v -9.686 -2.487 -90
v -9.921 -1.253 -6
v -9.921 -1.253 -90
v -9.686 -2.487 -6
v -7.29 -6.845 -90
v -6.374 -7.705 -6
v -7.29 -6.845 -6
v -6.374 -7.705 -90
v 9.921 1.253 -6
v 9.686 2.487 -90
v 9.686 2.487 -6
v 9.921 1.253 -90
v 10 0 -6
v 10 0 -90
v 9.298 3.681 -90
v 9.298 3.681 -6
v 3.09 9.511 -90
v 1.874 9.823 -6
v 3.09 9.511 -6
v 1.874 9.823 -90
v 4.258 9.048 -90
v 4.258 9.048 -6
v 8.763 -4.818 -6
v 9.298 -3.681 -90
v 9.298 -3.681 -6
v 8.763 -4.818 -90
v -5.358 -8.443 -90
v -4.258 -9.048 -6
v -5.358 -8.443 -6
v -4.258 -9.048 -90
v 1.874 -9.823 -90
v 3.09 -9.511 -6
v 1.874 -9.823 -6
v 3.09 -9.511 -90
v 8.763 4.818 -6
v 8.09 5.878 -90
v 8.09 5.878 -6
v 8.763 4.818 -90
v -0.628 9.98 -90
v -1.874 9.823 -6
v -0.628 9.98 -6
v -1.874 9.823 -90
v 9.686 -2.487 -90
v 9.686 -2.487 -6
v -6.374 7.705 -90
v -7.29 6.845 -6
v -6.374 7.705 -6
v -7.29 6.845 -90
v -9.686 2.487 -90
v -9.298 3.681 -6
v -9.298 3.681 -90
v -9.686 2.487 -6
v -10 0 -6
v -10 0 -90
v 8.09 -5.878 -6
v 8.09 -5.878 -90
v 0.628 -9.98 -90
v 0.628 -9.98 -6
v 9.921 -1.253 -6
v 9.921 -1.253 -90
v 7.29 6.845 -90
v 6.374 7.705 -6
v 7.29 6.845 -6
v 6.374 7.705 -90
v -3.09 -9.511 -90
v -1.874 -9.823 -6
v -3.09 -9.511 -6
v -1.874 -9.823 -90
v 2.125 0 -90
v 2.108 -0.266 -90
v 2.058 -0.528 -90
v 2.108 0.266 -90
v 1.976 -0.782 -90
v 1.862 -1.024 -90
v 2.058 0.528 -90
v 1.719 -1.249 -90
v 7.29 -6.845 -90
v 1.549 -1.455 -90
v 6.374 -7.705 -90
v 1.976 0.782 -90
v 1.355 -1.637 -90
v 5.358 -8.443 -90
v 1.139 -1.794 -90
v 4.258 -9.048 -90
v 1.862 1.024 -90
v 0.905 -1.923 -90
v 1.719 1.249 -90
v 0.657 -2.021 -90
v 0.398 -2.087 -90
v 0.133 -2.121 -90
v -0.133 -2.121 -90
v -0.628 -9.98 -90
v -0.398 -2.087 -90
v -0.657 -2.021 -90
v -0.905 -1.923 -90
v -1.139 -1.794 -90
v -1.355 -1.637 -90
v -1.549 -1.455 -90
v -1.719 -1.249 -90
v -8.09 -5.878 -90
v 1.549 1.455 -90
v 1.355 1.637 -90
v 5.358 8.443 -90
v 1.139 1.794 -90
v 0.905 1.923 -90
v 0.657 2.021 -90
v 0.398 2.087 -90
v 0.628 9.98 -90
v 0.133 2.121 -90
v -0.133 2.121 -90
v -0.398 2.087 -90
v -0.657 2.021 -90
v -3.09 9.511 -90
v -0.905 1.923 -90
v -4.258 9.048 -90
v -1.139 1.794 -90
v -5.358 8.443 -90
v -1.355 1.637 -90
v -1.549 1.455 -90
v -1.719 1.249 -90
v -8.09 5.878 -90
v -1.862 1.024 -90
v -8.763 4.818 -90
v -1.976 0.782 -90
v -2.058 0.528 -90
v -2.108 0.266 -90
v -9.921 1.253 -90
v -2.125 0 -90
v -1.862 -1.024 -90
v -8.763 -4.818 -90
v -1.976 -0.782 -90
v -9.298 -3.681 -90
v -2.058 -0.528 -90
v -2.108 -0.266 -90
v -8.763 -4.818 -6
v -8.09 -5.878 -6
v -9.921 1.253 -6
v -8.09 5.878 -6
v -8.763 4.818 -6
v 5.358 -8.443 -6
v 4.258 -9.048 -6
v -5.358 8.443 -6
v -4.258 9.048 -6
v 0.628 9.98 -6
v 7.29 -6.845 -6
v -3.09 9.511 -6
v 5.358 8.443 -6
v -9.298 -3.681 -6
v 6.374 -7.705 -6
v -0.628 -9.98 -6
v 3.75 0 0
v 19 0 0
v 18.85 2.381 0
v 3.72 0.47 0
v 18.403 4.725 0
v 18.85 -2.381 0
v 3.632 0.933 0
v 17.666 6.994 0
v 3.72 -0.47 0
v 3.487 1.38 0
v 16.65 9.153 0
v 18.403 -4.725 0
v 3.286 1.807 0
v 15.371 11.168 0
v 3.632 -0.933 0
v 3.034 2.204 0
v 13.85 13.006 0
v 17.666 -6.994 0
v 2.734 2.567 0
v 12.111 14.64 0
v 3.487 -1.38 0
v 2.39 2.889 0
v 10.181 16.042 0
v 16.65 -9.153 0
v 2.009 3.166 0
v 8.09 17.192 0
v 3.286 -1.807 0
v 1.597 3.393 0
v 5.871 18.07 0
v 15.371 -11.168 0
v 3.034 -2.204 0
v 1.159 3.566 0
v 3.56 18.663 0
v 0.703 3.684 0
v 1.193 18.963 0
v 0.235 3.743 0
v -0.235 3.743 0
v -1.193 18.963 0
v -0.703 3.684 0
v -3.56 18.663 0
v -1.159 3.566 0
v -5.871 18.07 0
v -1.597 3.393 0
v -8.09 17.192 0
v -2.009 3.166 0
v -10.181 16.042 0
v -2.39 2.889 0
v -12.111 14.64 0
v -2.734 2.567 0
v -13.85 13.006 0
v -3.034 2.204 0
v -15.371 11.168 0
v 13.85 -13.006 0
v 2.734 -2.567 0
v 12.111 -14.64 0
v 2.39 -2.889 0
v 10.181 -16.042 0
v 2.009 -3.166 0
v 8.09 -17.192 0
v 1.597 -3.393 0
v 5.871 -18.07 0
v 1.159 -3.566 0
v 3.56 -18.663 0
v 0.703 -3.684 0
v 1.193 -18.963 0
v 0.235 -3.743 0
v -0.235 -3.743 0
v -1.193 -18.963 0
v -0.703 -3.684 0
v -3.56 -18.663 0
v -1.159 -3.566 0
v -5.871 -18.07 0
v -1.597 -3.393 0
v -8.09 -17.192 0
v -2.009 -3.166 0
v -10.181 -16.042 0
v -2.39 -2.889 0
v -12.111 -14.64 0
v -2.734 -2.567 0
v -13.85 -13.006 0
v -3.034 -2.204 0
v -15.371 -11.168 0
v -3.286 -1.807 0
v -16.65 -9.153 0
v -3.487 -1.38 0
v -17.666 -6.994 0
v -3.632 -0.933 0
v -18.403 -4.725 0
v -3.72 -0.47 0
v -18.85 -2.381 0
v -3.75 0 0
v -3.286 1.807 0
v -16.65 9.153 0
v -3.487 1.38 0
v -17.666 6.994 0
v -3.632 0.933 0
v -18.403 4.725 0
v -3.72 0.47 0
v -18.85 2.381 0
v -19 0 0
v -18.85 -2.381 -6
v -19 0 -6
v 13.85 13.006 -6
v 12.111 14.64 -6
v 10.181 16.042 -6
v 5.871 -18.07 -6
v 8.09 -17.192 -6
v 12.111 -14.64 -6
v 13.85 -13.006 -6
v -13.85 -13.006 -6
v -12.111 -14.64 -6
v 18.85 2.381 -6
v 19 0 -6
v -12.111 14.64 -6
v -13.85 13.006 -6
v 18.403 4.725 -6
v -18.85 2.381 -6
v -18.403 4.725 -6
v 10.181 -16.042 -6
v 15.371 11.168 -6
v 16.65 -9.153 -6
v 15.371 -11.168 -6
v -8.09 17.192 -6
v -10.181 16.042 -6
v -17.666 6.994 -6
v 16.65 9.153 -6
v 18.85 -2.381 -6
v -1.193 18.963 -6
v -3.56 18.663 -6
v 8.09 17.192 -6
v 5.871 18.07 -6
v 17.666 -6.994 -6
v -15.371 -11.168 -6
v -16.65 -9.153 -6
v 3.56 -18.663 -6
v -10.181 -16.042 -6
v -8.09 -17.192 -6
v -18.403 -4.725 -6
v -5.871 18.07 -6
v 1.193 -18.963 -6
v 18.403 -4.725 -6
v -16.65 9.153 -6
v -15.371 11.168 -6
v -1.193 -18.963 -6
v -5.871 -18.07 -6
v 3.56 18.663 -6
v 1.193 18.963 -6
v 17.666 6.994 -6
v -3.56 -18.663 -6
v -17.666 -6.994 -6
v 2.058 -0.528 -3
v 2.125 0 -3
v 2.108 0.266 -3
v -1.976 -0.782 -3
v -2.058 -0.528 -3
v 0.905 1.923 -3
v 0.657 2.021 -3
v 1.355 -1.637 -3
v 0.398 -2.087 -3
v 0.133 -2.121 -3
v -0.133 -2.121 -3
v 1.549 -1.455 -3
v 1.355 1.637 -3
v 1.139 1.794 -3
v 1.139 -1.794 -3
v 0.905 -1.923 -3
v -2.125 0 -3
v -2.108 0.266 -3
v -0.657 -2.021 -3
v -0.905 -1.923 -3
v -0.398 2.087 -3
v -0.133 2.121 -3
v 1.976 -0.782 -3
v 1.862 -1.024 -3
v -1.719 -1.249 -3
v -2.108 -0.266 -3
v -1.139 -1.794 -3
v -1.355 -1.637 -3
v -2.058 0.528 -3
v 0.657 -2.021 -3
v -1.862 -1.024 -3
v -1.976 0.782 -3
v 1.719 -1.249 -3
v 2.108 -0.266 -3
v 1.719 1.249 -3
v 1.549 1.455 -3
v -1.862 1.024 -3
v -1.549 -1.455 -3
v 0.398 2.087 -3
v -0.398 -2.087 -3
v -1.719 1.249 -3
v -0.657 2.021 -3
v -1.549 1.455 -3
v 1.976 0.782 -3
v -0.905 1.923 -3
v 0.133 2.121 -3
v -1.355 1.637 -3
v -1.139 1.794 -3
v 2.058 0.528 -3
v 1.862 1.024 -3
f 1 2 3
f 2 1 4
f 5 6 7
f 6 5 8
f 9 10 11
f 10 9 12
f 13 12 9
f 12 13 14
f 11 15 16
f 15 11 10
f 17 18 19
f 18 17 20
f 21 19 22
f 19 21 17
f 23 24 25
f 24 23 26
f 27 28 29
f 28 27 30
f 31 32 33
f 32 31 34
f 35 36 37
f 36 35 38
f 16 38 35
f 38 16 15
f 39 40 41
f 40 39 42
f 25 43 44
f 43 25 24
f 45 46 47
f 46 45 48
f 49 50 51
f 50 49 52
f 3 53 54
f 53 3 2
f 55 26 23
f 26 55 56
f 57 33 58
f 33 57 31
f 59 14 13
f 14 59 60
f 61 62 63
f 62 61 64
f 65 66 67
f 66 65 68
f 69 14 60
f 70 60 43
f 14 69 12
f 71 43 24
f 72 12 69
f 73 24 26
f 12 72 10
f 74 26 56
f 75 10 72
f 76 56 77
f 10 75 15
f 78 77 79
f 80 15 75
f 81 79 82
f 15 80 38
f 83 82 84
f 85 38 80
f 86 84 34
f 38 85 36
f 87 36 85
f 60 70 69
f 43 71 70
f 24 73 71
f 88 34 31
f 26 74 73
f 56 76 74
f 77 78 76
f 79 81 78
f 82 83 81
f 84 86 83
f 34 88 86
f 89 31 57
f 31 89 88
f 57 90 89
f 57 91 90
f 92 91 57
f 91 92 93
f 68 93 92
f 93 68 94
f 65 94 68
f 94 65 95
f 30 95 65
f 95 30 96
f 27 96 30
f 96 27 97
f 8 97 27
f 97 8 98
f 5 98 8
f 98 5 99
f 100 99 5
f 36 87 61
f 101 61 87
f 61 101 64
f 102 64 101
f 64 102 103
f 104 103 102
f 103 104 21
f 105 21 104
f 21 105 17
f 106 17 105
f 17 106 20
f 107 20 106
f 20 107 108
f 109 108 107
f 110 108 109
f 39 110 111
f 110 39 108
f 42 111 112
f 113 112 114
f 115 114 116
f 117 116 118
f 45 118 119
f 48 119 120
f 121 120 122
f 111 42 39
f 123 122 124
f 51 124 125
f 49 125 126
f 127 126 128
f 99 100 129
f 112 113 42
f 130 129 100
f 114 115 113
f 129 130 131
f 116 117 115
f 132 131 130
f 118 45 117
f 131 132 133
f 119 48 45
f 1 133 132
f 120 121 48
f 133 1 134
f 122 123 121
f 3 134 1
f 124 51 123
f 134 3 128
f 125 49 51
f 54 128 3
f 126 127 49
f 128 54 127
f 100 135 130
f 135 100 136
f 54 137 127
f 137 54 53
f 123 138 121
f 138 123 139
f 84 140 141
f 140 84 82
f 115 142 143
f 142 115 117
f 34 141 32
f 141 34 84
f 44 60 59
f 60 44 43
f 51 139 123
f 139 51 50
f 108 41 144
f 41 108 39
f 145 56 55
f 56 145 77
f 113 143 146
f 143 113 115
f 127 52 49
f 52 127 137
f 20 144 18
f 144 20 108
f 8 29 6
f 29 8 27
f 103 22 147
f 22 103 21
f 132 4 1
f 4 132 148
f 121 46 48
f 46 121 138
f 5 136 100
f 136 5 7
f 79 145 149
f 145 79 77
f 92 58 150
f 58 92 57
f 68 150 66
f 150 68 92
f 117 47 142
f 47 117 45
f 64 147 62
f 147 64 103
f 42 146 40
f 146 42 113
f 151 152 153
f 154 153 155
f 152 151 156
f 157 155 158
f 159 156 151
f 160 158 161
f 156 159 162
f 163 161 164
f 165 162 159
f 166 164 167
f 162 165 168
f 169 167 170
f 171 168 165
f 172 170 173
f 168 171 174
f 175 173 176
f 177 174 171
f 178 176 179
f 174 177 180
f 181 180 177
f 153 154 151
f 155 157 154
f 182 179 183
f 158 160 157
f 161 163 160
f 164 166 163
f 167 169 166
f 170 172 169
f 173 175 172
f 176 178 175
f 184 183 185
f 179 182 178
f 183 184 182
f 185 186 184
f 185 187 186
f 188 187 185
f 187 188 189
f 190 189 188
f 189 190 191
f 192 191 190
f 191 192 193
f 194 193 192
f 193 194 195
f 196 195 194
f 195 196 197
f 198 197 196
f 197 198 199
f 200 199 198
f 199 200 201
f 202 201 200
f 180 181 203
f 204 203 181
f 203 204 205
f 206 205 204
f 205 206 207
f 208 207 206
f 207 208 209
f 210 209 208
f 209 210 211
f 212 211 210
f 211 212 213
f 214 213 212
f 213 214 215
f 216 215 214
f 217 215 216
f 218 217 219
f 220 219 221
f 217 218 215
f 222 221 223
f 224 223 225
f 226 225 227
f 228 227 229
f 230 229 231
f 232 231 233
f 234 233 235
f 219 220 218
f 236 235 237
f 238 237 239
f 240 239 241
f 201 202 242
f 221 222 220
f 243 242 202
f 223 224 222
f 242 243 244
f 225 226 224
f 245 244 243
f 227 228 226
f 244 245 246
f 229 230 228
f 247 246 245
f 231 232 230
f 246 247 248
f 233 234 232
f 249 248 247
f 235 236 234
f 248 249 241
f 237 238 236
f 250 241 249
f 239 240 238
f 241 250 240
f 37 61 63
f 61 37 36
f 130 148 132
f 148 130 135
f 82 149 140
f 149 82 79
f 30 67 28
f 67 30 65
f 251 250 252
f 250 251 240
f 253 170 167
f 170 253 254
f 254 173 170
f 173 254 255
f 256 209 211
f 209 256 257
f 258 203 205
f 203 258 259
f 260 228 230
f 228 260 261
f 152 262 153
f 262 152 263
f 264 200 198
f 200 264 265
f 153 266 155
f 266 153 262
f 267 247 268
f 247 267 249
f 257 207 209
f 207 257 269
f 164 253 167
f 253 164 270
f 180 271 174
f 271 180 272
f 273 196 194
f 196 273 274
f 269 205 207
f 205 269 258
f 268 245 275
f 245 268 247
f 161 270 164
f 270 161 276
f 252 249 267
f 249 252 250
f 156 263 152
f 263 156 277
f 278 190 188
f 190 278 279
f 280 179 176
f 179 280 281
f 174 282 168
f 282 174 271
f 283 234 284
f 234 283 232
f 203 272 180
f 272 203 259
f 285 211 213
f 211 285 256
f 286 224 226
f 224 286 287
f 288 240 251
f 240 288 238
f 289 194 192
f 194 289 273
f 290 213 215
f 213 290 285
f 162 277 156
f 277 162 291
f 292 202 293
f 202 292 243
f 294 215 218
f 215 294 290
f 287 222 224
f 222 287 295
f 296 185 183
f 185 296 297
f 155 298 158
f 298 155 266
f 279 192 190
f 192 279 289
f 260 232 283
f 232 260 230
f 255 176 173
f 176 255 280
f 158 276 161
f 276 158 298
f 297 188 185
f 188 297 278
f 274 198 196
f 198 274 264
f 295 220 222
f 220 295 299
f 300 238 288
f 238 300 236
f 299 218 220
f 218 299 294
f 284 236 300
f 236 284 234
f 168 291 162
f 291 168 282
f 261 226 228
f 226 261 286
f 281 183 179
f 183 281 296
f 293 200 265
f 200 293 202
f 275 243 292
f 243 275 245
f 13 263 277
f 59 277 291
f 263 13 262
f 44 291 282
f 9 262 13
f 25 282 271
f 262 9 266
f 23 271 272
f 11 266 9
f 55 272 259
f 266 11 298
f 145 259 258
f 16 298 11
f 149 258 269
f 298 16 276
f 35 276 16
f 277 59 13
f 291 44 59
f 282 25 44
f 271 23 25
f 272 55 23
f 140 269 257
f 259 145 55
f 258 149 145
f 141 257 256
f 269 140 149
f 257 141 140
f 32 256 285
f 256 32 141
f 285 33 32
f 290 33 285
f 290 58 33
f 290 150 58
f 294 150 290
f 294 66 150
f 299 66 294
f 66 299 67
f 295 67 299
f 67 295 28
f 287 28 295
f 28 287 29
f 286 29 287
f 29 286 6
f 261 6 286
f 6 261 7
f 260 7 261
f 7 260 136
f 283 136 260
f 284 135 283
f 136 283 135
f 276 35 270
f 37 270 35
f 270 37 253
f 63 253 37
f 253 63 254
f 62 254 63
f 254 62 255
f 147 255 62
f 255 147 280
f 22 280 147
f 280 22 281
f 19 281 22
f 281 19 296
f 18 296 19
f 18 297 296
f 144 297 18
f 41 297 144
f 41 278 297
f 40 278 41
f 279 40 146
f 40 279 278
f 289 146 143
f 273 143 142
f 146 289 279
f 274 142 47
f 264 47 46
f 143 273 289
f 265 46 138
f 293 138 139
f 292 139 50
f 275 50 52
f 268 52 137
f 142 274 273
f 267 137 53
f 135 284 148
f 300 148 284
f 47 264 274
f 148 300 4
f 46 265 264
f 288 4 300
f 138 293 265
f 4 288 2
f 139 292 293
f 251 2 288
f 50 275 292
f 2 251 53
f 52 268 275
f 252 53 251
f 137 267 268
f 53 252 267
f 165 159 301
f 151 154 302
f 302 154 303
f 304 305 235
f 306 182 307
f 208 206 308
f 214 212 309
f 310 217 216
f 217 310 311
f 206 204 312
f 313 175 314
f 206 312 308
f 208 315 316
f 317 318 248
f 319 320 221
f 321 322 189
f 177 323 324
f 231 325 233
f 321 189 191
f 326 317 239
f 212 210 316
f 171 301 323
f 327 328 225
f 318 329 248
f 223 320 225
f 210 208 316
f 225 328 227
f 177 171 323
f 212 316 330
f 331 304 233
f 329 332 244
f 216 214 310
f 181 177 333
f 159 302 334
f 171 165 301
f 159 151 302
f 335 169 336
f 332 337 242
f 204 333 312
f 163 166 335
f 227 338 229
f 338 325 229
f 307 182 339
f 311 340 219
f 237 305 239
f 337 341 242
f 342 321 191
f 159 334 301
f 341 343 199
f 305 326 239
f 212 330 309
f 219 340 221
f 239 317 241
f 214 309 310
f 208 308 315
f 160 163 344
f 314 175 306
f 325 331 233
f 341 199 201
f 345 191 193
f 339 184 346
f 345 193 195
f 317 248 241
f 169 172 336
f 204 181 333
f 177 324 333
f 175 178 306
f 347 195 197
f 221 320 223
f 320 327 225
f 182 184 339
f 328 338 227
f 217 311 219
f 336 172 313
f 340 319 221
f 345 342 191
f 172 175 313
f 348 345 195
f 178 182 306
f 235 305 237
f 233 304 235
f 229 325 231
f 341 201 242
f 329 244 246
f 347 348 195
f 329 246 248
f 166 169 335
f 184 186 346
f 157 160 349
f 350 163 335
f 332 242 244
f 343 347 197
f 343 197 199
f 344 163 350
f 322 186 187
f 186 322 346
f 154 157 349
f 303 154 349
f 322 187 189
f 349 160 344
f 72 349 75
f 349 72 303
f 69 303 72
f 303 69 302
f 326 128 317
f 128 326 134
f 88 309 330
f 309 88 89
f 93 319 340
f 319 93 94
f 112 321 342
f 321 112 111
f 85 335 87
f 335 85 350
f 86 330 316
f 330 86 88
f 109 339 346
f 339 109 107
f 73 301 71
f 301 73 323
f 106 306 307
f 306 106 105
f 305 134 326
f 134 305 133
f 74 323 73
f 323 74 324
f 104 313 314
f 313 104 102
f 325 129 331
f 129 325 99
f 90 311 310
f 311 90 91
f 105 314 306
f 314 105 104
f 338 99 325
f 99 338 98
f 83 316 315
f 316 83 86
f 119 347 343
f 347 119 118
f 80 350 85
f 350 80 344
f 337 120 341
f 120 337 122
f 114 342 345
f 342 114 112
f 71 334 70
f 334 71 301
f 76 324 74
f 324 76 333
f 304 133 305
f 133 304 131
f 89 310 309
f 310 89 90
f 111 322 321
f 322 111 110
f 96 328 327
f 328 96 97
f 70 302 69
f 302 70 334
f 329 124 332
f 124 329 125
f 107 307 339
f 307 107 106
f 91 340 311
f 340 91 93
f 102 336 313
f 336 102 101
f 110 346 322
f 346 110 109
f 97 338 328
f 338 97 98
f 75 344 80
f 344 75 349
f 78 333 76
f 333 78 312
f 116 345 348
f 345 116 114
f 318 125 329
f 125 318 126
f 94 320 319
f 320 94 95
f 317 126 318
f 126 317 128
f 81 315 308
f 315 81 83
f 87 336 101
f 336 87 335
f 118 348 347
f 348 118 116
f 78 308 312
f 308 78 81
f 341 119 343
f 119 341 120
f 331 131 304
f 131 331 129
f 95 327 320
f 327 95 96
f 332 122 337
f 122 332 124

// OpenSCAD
$fn = 50;


difference() {
	union() {
		translate(v = [0, 0, -90.0000000000]) {
			cylinder(h = 90, r = 10.0000000000);
		}
		translate(v = [0, 0, -6.0000000000]) {
			cylinder(h = 6, r = 19.0000000000);
		}
	}
	union() {
		translate(v = [0, 0, 0]) {
			rotate(a = [0, 0, 0]) {
				difference() {
					union() {
						#translate(v = [0, 0, -90.0000000000]) {
							cylinder(h = 90, r = 2.0000000000);
						}
						#translate(v = [0, 0, -3]) {
							cylinder(h = 3, r1 = 2.1250000000, r2 = 3.7500000000);
						}
						#translate(v = [0, 0, -90.0000000000]) {
							cylinder(h = 90, r = 2.1250000000);
						}
						#translate(v = [0, 0, -90.0000000000]) {
							cylinder(h = 90, r = 2.0000000000);
						}
					}
					union();
				}
			}
		}
	}
}
